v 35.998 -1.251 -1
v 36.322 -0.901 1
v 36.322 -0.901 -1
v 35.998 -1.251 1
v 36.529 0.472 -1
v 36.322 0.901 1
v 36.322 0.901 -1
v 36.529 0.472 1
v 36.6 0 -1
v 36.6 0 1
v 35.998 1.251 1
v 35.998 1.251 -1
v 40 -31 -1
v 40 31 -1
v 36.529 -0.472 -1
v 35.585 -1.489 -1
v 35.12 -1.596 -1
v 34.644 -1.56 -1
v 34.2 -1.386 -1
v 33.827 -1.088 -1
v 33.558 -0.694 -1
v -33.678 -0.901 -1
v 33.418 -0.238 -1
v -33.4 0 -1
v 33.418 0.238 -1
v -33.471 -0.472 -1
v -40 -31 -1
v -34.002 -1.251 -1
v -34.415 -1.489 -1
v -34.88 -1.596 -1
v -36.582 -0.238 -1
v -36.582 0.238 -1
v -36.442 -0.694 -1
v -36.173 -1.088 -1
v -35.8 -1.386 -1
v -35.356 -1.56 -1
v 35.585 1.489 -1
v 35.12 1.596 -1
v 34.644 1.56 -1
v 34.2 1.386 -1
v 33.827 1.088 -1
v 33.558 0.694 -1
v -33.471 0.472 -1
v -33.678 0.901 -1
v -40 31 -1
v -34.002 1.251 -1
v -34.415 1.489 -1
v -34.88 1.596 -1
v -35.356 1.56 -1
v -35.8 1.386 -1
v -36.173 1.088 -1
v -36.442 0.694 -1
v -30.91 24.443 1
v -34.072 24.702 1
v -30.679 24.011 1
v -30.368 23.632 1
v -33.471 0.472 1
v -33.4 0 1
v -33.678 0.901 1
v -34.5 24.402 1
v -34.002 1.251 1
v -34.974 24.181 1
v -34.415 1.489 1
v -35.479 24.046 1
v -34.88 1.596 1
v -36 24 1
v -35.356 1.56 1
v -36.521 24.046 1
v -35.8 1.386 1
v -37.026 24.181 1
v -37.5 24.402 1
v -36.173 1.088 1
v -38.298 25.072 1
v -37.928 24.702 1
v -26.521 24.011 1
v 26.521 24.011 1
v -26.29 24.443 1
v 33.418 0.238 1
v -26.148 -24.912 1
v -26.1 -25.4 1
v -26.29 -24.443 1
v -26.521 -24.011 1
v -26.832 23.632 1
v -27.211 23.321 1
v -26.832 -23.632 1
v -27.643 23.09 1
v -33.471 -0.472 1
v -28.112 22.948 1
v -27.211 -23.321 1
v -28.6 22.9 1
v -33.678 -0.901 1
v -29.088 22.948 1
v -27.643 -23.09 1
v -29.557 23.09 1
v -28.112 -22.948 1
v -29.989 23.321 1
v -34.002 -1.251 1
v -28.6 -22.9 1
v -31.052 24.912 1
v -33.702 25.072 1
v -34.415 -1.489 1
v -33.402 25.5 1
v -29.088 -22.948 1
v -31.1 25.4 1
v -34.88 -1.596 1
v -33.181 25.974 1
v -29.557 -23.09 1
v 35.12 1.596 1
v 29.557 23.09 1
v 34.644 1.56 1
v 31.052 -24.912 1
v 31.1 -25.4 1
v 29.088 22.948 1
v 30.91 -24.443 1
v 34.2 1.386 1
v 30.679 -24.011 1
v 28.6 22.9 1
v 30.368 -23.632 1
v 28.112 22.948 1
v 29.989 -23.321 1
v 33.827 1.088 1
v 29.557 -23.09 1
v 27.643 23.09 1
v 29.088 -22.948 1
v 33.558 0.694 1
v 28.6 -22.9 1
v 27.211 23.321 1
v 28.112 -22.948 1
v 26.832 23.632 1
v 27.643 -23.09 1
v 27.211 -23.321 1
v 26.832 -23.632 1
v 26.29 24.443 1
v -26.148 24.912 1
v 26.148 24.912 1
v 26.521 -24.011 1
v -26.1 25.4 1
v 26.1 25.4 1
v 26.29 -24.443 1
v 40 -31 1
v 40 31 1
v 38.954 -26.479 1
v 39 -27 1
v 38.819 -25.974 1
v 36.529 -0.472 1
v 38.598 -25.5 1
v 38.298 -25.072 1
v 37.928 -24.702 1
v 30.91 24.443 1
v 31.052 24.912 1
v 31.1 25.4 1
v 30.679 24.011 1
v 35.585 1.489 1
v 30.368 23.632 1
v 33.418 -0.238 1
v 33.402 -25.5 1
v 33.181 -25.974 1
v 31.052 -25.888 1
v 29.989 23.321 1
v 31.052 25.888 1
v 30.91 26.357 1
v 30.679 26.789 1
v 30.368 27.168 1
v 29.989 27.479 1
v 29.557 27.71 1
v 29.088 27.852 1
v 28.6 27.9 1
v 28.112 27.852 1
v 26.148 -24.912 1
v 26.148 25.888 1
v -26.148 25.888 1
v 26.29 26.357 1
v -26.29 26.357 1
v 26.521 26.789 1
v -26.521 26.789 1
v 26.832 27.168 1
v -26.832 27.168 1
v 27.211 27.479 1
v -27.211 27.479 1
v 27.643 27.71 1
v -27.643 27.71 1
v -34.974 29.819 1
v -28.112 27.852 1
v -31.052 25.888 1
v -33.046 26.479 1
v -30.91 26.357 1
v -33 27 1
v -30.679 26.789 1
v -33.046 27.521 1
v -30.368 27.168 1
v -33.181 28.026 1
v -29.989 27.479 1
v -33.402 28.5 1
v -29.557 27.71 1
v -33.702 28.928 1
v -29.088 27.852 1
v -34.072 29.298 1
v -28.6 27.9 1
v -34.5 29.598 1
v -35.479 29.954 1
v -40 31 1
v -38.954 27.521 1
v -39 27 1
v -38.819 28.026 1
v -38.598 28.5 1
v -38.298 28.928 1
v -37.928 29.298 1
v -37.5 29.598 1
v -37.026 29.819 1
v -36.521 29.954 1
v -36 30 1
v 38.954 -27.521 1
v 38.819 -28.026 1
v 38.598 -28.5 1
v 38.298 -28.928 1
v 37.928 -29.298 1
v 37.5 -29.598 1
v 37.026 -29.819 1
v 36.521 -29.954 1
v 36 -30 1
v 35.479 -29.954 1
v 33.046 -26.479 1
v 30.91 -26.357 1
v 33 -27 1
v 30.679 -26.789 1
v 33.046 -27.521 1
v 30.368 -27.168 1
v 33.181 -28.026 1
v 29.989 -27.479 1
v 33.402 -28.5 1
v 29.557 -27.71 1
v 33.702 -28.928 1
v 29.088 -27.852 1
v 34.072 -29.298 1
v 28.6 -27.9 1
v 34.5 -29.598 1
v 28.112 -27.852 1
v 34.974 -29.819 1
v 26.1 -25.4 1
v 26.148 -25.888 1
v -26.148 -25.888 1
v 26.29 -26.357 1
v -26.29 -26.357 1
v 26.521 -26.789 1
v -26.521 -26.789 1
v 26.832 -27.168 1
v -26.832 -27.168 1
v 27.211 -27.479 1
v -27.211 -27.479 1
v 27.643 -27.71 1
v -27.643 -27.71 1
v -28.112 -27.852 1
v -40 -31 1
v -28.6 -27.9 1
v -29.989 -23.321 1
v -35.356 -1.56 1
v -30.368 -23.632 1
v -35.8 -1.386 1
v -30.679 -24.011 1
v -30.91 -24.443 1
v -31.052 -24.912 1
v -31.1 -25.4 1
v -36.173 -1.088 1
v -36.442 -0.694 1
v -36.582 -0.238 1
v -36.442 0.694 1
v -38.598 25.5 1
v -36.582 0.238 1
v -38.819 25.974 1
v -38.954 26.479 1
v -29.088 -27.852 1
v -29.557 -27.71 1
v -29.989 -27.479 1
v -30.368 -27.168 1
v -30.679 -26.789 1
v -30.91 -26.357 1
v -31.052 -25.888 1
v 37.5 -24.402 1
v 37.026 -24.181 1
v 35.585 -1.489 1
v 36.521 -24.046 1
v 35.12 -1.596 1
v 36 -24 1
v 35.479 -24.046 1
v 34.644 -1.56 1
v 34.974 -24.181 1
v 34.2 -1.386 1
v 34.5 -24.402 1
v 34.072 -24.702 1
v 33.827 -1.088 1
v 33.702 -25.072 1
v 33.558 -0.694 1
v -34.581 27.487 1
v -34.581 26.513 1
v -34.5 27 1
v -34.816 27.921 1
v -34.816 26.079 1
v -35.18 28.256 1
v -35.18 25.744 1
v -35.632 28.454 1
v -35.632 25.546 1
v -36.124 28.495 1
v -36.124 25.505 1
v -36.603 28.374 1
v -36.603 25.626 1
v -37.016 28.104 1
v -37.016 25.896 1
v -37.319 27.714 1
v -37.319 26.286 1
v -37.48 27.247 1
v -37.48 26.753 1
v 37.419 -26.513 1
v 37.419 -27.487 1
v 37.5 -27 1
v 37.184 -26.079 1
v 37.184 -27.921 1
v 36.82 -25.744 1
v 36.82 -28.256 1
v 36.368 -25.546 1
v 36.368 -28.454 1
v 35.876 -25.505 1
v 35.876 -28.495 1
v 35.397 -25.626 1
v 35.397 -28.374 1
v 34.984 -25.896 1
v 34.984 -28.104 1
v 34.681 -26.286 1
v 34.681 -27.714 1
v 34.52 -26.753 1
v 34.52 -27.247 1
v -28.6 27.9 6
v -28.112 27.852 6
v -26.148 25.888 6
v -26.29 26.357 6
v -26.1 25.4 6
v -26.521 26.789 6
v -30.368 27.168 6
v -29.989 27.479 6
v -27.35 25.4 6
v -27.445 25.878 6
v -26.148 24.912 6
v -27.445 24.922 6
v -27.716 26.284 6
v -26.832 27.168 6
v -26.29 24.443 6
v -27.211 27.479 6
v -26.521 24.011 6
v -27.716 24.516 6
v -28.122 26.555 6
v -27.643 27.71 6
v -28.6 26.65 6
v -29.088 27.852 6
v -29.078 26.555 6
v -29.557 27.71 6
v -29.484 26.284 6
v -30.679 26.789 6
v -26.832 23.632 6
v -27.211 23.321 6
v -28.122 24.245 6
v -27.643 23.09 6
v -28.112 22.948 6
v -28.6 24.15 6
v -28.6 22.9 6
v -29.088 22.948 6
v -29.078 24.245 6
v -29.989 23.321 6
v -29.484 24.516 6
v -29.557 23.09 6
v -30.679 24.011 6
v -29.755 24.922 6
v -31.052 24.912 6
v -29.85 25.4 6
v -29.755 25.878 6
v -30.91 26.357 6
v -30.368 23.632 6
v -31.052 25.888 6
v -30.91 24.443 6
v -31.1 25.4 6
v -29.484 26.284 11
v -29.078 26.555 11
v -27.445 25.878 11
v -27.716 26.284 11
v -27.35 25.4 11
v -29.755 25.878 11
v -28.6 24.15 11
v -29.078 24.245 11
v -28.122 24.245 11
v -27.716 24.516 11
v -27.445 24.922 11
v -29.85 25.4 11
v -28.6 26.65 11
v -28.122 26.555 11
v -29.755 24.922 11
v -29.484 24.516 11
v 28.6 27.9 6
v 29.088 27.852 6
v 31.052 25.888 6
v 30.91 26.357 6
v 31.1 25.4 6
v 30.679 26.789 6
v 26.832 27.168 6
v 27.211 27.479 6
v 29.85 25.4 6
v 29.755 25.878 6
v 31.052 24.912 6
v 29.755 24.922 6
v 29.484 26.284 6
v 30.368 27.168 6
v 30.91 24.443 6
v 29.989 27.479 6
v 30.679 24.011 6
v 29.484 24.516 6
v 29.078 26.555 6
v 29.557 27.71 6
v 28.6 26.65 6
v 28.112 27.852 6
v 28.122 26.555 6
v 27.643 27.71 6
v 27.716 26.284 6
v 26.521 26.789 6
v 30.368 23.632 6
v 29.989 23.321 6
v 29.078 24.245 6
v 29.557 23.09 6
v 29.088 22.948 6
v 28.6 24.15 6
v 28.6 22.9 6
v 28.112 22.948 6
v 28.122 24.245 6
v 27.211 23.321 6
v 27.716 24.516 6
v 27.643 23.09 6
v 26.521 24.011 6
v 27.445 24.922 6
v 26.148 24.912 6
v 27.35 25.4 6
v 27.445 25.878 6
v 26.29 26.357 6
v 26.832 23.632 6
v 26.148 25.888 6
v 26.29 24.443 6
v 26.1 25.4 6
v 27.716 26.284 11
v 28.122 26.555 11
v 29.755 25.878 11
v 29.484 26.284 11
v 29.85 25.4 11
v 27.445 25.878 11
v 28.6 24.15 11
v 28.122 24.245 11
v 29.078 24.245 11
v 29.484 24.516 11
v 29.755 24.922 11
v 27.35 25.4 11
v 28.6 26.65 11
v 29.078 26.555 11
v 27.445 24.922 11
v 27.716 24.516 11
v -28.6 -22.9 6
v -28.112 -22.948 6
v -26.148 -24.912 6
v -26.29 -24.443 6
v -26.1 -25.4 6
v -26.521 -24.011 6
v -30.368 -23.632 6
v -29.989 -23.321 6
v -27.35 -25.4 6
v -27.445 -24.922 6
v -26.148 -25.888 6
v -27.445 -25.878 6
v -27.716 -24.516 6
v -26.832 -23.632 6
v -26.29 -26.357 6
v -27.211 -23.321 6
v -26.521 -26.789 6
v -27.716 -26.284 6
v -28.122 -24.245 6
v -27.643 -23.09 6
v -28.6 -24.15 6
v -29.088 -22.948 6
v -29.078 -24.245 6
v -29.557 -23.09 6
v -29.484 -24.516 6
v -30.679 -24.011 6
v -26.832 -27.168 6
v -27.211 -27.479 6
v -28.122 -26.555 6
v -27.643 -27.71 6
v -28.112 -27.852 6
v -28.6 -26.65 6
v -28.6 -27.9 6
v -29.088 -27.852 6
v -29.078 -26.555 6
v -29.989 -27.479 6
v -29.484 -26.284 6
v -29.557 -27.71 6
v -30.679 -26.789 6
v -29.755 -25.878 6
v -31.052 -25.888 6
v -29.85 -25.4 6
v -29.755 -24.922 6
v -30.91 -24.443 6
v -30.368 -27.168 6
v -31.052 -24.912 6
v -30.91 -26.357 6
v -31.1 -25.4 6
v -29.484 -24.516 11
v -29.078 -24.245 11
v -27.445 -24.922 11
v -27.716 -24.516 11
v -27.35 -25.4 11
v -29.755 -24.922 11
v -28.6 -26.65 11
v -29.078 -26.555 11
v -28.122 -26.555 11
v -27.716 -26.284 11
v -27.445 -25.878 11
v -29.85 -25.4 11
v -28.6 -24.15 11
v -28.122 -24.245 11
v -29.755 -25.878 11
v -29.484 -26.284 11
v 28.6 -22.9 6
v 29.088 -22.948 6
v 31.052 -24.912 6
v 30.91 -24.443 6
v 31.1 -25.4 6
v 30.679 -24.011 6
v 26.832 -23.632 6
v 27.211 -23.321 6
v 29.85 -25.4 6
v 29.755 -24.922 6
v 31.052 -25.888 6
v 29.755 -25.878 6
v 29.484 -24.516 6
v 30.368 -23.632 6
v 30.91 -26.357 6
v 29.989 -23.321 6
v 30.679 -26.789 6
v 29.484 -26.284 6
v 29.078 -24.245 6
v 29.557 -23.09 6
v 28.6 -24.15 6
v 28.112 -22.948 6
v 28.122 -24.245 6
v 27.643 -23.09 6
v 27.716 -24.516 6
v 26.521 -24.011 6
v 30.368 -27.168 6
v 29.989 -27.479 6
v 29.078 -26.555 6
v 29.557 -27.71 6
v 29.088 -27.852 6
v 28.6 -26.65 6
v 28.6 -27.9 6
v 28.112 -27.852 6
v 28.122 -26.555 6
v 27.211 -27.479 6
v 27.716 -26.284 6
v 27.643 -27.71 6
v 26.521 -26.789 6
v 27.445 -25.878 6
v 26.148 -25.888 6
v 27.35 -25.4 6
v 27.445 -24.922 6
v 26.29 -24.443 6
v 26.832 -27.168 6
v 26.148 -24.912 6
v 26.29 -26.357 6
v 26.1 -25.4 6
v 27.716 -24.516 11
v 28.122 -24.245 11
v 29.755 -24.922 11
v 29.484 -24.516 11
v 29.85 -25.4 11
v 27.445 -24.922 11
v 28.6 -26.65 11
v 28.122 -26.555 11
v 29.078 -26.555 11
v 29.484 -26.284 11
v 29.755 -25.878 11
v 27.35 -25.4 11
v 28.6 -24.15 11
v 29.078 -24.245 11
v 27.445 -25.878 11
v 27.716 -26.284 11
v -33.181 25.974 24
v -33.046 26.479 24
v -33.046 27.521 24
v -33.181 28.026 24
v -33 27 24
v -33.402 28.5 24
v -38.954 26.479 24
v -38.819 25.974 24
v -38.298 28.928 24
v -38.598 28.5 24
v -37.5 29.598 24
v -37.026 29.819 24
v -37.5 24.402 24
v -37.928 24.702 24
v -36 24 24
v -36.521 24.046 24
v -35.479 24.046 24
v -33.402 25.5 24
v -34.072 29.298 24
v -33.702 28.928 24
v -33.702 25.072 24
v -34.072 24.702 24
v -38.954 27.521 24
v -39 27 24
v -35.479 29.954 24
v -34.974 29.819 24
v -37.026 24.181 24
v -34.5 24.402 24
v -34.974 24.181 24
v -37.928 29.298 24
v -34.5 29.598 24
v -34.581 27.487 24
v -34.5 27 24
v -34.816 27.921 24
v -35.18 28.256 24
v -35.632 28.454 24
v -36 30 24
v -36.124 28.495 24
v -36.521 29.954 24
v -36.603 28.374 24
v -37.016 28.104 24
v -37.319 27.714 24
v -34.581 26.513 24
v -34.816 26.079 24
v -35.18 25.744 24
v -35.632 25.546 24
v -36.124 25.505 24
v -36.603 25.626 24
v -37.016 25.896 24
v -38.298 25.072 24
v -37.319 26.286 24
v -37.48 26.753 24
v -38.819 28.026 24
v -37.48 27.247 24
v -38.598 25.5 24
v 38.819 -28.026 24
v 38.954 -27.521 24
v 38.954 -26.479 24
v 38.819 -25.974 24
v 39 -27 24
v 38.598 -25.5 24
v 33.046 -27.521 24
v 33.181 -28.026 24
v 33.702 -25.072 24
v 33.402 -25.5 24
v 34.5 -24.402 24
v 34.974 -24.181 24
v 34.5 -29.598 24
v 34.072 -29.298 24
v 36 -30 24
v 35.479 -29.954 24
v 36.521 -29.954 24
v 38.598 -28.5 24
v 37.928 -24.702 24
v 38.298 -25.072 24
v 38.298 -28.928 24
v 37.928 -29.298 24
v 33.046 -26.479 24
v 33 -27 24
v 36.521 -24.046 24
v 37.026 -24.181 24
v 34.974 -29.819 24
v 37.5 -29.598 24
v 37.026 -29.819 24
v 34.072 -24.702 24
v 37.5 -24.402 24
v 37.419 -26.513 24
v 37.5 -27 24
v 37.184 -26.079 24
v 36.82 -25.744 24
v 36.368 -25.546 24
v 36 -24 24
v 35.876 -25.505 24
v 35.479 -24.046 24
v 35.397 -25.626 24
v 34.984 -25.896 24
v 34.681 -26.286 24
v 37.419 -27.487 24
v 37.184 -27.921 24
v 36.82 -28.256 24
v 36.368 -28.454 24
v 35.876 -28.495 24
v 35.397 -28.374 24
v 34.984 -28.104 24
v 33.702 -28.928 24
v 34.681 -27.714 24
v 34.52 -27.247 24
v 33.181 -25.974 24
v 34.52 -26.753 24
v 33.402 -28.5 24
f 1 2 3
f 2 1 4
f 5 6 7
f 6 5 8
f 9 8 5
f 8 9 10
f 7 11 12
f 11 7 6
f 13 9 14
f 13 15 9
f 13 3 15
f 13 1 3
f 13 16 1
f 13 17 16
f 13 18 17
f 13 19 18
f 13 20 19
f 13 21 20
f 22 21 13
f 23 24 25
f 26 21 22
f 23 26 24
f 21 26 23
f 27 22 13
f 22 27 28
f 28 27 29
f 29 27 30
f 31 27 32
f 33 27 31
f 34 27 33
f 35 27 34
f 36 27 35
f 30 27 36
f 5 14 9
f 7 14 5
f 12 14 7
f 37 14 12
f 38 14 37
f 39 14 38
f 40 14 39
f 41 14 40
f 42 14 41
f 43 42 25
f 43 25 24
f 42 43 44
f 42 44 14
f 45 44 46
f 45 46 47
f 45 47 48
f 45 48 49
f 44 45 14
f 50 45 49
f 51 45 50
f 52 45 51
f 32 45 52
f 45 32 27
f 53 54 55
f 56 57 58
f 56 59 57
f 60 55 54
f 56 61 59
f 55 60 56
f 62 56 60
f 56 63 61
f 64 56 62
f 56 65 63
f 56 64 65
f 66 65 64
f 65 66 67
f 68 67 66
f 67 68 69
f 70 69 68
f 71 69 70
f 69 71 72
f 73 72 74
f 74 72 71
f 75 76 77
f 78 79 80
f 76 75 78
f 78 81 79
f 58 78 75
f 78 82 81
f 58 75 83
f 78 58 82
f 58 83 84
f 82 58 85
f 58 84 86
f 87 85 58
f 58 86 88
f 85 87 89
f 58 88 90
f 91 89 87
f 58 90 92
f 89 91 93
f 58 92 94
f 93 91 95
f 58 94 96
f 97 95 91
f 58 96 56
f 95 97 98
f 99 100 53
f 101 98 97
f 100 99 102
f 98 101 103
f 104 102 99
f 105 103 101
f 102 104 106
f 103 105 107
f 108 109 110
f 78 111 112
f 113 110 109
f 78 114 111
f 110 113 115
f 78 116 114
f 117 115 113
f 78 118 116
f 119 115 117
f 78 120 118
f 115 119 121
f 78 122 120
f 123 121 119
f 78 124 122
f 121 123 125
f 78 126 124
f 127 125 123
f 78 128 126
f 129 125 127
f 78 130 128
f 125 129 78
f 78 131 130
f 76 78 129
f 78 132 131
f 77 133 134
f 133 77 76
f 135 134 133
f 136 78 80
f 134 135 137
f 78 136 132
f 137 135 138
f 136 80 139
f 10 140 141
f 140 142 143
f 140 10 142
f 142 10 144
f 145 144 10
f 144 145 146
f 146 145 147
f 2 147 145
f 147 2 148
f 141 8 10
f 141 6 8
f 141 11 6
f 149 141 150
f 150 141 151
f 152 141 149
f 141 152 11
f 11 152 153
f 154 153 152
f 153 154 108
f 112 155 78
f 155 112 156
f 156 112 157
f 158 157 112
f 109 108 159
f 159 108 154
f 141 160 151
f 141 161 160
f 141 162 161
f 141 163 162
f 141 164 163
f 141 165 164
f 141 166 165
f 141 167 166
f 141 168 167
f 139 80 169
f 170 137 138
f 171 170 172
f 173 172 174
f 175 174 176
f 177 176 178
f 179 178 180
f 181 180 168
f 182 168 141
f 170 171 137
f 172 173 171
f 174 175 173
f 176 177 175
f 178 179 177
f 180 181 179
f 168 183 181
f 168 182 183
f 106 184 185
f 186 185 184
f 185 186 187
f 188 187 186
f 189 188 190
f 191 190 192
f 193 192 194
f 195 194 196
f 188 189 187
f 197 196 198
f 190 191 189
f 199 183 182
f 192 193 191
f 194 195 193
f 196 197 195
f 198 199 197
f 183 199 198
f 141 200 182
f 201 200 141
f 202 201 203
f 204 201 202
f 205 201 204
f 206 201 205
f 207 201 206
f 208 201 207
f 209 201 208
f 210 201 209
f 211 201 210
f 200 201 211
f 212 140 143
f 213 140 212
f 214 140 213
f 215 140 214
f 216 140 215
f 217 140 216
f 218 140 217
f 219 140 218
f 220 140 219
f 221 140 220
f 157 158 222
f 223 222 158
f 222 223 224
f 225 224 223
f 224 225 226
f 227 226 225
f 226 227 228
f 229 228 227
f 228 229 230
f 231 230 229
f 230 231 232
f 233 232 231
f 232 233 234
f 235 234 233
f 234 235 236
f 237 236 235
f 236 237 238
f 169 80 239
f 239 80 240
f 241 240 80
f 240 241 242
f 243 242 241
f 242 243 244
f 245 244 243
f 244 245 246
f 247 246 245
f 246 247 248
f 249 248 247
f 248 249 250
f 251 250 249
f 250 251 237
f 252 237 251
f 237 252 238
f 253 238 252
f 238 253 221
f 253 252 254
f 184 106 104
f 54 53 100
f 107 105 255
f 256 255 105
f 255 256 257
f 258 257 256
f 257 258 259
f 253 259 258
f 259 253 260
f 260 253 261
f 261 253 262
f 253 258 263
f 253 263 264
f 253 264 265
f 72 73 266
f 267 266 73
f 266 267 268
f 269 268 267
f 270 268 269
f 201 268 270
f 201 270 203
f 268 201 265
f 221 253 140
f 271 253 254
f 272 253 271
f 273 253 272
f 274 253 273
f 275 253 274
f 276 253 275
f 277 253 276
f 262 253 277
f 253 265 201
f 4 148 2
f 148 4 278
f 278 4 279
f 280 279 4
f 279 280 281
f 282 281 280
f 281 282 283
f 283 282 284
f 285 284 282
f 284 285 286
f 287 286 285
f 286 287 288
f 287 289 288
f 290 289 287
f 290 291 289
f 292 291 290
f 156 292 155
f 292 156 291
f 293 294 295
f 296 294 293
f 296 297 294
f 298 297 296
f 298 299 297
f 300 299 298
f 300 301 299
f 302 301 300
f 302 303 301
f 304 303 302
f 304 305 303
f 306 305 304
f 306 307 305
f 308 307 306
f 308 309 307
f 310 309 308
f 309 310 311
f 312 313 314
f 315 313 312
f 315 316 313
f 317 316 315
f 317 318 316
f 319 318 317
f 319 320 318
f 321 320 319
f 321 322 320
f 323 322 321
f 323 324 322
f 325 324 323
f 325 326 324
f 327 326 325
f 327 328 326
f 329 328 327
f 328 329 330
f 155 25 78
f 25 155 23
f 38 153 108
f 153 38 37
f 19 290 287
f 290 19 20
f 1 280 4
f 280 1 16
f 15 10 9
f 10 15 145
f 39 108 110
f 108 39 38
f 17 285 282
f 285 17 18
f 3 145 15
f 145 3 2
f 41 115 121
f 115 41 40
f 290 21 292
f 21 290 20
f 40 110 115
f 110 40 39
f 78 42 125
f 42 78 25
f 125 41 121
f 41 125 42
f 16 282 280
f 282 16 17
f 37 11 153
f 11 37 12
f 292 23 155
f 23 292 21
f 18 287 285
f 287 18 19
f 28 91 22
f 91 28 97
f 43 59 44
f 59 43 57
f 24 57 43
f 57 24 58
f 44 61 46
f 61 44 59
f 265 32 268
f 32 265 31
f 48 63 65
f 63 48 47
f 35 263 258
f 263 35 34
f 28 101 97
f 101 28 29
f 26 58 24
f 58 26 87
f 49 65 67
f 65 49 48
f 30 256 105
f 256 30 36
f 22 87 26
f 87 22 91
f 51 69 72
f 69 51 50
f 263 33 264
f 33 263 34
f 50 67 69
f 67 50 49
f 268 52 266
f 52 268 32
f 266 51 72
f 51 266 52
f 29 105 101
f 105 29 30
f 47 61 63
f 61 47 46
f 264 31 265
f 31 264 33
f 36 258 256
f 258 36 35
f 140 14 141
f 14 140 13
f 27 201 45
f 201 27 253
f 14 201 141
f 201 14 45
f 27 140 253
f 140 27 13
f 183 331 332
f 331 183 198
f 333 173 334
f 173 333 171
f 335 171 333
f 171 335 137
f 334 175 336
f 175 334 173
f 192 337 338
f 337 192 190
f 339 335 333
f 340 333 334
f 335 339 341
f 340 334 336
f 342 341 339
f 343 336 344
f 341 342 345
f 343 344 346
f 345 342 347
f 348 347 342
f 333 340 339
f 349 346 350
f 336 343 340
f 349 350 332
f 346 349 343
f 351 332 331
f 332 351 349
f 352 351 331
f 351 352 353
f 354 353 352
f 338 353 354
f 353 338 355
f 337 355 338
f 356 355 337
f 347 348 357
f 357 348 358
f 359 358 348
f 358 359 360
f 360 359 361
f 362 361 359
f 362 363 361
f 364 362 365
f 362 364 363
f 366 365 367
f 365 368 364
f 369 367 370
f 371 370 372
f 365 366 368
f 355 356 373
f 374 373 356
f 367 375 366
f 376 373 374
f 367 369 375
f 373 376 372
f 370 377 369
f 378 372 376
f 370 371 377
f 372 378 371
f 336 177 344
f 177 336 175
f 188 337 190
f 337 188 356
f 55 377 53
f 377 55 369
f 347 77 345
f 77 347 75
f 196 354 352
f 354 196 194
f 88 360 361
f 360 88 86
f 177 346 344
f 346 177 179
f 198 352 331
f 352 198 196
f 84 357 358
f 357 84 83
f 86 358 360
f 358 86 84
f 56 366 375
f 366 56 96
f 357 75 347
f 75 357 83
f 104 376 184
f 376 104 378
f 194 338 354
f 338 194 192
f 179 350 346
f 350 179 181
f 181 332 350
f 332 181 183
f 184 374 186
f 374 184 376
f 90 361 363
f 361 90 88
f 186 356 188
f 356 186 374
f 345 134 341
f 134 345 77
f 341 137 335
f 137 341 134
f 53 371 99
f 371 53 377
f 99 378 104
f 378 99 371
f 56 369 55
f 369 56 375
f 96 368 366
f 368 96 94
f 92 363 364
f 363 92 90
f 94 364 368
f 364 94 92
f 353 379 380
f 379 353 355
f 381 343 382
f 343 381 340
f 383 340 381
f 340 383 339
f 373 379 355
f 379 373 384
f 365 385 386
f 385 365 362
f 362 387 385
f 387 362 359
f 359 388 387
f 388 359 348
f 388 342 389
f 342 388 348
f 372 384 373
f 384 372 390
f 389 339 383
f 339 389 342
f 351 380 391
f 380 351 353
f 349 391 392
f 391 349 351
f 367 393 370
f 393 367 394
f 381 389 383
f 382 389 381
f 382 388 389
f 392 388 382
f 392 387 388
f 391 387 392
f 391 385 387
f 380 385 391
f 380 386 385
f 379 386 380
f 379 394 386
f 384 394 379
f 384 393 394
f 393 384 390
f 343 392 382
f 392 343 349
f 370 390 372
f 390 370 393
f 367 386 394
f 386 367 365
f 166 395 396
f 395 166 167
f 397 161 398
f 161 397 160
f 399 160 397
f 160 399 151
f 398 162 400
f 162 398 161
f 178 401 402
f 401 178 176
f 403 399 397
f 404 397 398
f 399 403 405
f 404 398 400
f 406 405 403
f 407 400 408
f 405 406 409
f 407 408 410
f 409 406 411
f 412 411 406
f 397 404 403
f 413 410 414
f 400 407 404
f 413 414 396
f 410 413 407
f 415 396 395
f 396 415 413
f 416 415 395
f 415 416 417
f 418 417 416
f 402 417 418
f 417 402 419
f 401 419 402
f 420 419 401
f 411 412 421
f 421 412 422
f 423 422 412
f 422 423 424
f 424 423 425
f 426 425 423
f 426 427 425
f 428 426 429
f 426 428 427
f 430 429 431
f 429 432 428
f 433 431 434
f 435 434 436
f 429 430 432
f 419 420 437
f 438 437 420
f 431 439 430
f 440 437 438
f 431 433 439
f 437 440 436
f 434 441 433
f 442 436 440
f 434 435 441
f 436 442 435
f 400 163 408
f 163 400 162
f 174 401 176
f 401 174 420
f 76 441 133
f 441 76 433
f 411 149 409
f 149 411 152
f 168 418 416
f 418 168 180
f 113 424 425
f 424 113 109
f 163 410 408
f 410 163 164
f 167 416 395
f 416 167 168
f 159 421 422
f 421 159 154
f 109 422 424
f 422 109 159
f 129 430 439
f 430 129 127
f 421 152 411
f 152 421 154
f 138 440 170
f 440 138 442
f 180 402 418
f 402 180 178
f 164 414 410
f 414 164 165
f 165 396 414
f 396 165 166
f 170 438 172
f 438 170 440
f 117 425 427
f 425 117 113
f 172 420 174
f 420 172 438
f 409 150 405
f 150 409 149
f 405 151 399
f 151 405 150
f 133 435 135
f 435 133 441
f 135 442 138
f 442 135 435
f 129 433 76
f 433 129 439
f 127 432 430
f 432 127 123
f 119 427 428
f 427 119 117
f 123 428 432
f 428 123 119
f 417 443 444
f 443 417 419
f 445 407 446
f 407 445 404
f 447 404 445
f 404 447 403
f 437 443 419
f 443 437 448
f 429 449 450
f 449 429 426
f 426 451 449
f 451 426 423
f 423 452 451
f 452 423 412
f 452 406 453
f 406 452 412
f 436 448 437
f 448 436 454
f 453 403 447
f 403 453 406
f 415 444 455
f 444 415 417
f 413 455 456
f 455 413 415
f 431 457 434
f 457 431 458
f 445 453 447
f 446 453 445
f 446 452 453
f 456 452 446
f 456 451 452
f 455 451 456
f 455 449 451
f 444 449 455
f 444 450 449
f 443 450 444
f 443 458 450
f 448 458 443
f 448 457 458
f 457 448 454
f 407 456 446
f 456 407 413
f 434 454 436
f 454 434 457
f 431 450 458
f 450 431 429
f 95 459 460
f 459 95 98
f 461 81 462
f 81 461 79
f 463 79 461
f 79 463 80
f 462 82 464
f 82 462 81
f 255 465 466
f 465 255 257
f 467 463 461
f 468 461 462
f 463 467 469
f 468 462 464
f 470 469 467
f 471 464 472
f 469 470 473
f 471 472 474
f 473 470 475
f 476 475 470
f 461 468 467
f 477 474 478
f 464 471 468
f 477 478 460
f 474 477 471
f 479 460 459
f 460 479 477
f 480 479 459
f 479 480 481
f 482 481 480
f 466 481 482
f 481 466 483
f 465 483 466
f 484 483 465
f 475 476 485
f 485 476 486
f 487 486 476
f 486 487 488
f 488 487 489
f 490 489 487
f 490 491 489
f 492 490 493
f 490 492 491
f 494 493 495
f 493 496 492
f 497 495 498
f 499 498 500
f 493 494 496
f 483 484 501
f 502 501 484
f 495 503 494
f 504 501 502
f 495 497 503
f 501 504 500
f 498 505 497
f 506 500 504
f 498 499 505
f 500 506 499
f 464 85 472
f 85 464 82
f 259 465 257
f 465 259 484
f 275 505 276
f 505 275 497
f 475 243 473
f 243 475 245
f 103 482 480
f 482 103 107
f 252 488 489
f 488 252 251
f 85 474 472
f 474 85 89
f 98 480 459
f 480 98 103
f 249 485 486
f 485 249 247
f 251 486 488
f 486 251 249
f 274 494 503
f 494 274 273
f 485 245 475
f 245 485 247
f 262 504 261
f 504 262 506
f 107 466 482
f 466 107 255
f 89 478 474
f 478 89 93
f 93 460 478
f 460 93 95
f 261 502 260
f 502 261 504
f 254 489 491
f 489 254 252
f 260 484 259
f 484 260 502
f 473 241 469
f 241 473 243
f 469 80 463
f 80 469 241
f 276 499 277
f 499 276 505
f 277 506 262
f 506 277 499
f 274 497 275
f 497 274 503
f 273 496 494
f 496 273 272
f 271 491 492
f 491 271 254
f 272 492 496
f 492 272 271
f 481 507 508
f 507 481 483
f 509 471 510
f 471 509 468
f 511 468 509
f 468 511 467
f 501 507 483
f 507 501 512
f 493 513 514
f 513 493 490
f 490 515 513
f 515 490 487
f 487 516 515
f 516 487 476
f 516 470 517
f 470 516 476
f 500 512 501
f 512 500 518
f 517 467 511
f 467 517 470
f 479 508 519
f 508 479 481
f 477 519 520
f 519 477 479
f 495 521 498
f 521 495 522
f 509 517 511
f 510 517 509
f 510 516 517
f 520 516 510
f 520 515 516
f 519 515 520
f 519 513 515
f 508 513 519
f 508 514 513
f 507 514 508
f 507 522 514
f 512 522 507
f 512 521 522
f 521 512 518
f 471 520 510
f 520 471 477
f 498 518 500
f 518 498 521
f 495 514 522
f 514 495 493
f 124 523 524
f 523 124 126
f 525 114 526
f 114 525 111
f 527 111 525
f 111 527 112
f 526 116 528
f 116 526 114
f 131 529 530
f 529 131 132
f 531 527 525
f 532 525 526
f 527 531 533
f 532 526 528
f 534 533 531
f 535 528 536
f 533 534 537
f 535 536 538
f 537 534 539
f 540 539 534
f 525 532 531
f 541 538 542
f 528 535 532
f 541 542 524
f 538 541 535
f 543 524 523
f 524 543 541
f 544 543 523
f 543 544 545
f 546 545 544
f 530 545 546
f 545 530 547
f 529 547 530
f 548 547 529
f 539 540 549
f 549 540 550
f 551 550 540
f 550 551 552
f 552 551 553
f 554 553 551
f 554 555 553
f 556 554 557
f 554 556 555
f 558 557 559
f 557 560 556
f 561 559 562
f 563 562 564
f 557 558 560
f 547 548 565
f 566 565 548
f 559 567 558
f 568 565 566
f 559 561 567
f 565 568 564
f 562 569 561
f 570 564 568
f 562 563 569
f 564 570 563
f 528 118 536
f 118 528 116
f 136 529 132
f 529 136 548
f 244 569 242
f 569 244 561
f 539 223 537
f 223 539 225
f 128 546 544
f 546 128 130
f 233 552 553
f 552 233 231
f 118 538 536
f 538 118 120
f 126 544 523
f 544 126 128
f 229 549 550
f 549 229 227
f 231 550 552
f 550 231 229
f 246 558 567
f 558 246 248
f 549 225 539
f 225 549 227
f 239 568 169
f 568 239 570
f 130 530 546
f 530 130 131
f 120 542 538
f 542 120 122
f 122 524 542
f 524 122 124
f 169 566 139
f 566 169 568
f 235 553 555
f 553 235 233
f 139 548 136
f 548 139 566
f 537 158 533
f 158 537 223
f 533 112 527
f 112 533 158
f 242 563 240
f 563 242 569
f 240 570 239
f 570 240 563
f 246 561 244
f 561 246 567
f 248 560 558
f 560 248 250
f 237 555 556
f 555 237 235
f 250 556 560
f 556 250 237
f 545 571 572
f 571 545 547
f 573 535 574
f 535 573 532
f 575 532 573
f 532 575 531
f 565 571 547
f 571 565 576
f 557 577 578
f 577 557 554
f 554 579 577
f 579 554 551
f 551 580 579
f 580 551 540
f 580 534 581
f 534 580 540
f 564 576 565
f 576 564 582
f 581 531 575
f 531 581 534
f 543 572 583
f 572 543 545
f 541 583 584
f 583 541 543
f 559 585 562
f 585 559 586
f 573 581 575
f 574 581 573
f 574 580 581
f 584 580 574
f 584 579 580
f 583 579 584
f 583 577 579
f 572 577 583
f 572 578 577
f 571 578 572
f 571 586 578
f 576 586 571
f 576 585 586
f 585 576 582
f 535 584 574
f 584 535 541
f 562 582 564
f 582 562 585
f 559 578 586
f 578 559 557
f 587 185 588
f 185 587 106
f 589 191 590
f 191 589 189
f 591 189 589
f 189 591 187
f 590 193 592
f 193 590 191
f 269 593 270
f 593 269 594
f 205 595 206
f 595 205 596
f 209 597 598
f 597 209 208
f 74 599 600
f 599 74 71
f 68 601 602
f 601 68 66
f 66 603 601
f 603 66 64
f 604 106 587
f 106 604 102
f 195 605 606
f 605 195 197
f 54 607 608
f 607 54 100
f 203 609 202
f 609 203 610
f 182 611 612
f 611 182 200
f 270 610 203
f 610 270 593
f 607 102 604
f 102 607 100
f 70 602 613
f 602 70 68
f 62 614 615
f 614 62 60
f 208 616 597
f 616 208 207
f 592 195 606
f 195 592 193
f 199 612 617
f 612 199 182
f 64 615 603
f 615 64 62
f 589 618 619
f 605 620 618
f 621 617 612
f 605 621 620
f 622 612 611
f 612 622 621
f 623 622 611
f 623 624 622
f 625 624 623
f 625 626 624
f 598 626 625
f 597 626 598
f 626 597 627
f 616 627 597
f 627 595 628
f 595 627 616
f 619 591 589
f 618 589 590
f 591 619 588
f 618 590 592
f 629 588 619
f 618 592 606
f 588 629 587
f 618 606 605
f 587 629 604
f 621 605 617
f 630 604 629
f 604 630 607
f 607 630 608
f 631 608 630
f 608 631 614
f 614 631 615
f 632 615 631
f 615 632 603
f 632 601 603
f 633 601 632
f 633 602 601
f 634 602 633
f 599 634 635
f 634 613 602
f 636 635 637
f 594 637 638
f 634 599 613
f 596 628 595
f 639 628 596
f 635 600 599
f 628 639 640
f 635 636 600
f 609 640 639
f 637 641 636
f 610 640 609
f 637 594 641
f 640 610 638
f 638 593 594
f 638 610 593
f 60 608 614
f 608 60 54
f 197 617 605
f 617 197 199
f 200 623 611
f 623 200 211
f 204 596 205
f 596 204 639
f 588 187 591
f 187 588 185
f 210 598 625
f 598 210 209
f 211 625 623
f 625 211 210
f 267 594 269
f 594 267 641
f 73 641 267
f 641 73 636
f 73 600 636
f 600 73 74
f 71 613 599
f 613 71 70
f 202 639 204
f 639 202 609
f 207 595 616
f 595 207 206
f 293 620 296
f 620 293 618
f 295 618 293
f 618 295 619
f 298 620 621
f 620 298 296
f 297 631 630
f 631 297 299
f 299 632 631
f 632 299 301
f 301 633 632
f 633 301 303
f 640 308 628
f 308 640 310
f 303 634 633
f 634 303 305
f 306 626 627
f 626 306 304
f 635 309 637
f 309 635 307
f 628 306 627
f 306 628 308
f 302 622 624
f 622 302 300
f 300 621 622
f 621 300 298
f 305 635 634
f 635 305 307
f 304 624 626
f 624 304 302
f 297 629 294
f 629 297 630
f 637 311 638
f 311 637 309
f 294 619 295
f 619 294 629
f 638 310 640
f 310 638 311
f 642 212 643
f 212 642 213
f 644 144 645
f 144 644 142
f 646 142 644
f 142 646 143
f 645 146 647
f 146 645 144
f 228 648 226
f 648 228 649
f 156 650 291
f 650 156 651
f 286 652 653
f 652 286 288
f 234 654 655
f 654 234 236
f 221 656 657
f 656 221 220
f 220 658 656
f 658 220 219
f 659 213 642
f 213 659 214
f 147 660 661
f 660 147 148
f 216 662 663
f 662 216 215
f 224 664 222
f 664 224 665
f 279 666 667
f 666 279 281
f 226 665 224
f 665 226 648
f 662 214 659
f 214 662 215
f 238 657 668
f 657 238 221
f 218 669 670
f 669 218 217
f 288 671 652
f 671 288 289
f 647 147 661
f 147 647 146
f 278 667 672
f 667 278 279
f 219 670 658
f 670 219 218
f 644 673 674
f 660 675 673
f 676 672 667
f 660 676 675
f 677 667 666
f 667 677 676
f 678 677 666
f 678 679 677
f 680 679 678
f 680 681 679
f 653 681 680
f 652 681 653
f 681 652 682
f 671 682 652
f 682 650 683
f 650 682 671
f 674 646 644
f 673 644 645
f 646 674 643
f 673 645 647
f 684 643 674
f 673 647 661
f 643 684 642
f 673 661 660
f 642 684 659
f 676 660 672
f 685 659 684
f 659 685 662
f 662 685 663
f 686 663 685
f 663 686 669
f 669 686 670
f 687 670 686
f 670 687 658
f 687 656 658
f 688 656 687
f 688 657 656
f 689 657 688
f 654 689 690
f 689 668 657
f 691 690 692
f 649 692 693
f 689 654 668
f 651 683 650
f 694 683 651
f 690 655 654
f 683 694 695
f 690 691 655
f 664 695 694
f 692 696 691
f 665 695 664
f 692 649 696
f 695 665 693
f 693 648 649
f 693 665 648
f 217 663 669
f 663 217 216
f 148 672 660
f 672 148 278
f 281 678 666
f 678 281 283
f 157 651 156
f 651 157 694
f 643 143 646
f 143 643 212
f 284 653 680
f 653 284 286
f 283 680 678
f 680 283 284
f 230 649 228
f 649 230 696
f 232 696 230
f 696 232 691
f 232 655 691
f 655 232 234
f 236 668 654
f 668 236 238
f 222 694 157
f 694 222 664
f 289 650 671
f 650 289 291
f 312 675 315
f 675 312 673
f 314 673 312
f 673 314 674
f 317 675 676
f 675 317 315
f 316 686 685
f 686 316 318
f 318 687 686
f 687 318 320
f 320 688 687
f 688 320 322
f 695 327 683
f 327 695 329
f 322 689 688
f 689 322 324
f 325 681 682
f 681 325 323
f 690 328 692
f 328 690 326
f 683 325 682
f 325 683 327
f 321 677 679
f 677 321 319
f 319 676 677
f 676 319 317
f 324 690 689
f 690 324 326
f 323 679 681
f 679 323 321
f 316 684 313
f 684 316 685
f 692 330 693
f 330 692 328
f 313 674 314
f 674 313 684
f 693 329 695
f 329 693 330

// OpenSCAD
$fa = 10;
$fs = 0.5;

module rounded_cube(size, radius) {
    width = size[0];
    height = size[1];
    depth = size[2];

    minkowski() {
        cube([width - 2 * radius, height - 2 * radius, depth - 2 * radius], center=true);
        sphere(radius);
    }
}

module case_top(size, radius, thickness) {
    width = size[0];
    height = size[1];
    depth = size[2];
    
    difference() {
        translate([0, 0, radius / 2]) {
            // make depth bigger ...
            rounded_cube([width, height, depth + radius], radius);
        }
        // ...and cut rounded parts at bottom
        translate([0, 0, depth / 2 + radius / 2]) {
            cube([width, height, radius], center=true);
        }
        translate([0, 0, depth / 2 - 1]) {
            // create notch at the bottom
            cube([width - thickness, height - thickness, 2], center=true);
        }
        translate([0, 0, thickness]) {
            // make case hollow
            cube([width - thickness * 2, height - thickness * 2, depth], center=true);
        }
    }
}

module pcb_column(height, innerHeight, outer, inner) {
    union() {
        translate([0, 0, 0]) {
            cylinder(h=height, r=outer, center=true);
            translate([0, 0, (innerHeight - height) / 2]) cylinder(h=innerHeight, r=inner, center=true);
        }
    }
}

module pcb_column(height, innerHeight, outer, inner) {
    union() {
        translate([0, 0, 0]) {
            cylinder(h=height, r=outer);
            translate([0, 0, height]) cylinder(h=innerHeight - height, r=inner);
        }
    }
}

module pcb_columns() {
    translate([-28.6, 25.4, 0]) pcb_column(5, 10, 2.5, 1.25);
    translate([28.6, 25.4, 0]) pcb_column(5, 10, 2.5, 1.25);
    translate([-28.6, -25.4, 0]) pcb_column(5, 10, 2.5, 1.25);
    translate([28.6, -25.4, 0]) pcb_column(5, 10, 2.5, 1.25);
}

module case_column(height, outer, inner) {
    difference() {
        cylinder(h=height, r=outer);
        cylinder(h=height, r=inner);
    }
}

module case_columns() {
    translate([-36, 27, 0]) case_column(23, 3, 1.5);
    translate([36, -27, 0]) case_column(23, 3, 1.5);
}

module screw_holes() {
    translate([35, 0, 0]) cylinder(h=2, r=1.6, center=true);
    translate([-35, 0, 0]) cylinder(h=2, r=1.6, center=true);
}
module main() {
    union() {
        difference() {
            translate([0, 0, 0]) cube([80, 62, 2], center=true);
            screw_holes();
        }
        translate([0, 0, 1]) pcb_columns();
        translate([0, 0, 1]) case_columns();        
    }
}

main();
